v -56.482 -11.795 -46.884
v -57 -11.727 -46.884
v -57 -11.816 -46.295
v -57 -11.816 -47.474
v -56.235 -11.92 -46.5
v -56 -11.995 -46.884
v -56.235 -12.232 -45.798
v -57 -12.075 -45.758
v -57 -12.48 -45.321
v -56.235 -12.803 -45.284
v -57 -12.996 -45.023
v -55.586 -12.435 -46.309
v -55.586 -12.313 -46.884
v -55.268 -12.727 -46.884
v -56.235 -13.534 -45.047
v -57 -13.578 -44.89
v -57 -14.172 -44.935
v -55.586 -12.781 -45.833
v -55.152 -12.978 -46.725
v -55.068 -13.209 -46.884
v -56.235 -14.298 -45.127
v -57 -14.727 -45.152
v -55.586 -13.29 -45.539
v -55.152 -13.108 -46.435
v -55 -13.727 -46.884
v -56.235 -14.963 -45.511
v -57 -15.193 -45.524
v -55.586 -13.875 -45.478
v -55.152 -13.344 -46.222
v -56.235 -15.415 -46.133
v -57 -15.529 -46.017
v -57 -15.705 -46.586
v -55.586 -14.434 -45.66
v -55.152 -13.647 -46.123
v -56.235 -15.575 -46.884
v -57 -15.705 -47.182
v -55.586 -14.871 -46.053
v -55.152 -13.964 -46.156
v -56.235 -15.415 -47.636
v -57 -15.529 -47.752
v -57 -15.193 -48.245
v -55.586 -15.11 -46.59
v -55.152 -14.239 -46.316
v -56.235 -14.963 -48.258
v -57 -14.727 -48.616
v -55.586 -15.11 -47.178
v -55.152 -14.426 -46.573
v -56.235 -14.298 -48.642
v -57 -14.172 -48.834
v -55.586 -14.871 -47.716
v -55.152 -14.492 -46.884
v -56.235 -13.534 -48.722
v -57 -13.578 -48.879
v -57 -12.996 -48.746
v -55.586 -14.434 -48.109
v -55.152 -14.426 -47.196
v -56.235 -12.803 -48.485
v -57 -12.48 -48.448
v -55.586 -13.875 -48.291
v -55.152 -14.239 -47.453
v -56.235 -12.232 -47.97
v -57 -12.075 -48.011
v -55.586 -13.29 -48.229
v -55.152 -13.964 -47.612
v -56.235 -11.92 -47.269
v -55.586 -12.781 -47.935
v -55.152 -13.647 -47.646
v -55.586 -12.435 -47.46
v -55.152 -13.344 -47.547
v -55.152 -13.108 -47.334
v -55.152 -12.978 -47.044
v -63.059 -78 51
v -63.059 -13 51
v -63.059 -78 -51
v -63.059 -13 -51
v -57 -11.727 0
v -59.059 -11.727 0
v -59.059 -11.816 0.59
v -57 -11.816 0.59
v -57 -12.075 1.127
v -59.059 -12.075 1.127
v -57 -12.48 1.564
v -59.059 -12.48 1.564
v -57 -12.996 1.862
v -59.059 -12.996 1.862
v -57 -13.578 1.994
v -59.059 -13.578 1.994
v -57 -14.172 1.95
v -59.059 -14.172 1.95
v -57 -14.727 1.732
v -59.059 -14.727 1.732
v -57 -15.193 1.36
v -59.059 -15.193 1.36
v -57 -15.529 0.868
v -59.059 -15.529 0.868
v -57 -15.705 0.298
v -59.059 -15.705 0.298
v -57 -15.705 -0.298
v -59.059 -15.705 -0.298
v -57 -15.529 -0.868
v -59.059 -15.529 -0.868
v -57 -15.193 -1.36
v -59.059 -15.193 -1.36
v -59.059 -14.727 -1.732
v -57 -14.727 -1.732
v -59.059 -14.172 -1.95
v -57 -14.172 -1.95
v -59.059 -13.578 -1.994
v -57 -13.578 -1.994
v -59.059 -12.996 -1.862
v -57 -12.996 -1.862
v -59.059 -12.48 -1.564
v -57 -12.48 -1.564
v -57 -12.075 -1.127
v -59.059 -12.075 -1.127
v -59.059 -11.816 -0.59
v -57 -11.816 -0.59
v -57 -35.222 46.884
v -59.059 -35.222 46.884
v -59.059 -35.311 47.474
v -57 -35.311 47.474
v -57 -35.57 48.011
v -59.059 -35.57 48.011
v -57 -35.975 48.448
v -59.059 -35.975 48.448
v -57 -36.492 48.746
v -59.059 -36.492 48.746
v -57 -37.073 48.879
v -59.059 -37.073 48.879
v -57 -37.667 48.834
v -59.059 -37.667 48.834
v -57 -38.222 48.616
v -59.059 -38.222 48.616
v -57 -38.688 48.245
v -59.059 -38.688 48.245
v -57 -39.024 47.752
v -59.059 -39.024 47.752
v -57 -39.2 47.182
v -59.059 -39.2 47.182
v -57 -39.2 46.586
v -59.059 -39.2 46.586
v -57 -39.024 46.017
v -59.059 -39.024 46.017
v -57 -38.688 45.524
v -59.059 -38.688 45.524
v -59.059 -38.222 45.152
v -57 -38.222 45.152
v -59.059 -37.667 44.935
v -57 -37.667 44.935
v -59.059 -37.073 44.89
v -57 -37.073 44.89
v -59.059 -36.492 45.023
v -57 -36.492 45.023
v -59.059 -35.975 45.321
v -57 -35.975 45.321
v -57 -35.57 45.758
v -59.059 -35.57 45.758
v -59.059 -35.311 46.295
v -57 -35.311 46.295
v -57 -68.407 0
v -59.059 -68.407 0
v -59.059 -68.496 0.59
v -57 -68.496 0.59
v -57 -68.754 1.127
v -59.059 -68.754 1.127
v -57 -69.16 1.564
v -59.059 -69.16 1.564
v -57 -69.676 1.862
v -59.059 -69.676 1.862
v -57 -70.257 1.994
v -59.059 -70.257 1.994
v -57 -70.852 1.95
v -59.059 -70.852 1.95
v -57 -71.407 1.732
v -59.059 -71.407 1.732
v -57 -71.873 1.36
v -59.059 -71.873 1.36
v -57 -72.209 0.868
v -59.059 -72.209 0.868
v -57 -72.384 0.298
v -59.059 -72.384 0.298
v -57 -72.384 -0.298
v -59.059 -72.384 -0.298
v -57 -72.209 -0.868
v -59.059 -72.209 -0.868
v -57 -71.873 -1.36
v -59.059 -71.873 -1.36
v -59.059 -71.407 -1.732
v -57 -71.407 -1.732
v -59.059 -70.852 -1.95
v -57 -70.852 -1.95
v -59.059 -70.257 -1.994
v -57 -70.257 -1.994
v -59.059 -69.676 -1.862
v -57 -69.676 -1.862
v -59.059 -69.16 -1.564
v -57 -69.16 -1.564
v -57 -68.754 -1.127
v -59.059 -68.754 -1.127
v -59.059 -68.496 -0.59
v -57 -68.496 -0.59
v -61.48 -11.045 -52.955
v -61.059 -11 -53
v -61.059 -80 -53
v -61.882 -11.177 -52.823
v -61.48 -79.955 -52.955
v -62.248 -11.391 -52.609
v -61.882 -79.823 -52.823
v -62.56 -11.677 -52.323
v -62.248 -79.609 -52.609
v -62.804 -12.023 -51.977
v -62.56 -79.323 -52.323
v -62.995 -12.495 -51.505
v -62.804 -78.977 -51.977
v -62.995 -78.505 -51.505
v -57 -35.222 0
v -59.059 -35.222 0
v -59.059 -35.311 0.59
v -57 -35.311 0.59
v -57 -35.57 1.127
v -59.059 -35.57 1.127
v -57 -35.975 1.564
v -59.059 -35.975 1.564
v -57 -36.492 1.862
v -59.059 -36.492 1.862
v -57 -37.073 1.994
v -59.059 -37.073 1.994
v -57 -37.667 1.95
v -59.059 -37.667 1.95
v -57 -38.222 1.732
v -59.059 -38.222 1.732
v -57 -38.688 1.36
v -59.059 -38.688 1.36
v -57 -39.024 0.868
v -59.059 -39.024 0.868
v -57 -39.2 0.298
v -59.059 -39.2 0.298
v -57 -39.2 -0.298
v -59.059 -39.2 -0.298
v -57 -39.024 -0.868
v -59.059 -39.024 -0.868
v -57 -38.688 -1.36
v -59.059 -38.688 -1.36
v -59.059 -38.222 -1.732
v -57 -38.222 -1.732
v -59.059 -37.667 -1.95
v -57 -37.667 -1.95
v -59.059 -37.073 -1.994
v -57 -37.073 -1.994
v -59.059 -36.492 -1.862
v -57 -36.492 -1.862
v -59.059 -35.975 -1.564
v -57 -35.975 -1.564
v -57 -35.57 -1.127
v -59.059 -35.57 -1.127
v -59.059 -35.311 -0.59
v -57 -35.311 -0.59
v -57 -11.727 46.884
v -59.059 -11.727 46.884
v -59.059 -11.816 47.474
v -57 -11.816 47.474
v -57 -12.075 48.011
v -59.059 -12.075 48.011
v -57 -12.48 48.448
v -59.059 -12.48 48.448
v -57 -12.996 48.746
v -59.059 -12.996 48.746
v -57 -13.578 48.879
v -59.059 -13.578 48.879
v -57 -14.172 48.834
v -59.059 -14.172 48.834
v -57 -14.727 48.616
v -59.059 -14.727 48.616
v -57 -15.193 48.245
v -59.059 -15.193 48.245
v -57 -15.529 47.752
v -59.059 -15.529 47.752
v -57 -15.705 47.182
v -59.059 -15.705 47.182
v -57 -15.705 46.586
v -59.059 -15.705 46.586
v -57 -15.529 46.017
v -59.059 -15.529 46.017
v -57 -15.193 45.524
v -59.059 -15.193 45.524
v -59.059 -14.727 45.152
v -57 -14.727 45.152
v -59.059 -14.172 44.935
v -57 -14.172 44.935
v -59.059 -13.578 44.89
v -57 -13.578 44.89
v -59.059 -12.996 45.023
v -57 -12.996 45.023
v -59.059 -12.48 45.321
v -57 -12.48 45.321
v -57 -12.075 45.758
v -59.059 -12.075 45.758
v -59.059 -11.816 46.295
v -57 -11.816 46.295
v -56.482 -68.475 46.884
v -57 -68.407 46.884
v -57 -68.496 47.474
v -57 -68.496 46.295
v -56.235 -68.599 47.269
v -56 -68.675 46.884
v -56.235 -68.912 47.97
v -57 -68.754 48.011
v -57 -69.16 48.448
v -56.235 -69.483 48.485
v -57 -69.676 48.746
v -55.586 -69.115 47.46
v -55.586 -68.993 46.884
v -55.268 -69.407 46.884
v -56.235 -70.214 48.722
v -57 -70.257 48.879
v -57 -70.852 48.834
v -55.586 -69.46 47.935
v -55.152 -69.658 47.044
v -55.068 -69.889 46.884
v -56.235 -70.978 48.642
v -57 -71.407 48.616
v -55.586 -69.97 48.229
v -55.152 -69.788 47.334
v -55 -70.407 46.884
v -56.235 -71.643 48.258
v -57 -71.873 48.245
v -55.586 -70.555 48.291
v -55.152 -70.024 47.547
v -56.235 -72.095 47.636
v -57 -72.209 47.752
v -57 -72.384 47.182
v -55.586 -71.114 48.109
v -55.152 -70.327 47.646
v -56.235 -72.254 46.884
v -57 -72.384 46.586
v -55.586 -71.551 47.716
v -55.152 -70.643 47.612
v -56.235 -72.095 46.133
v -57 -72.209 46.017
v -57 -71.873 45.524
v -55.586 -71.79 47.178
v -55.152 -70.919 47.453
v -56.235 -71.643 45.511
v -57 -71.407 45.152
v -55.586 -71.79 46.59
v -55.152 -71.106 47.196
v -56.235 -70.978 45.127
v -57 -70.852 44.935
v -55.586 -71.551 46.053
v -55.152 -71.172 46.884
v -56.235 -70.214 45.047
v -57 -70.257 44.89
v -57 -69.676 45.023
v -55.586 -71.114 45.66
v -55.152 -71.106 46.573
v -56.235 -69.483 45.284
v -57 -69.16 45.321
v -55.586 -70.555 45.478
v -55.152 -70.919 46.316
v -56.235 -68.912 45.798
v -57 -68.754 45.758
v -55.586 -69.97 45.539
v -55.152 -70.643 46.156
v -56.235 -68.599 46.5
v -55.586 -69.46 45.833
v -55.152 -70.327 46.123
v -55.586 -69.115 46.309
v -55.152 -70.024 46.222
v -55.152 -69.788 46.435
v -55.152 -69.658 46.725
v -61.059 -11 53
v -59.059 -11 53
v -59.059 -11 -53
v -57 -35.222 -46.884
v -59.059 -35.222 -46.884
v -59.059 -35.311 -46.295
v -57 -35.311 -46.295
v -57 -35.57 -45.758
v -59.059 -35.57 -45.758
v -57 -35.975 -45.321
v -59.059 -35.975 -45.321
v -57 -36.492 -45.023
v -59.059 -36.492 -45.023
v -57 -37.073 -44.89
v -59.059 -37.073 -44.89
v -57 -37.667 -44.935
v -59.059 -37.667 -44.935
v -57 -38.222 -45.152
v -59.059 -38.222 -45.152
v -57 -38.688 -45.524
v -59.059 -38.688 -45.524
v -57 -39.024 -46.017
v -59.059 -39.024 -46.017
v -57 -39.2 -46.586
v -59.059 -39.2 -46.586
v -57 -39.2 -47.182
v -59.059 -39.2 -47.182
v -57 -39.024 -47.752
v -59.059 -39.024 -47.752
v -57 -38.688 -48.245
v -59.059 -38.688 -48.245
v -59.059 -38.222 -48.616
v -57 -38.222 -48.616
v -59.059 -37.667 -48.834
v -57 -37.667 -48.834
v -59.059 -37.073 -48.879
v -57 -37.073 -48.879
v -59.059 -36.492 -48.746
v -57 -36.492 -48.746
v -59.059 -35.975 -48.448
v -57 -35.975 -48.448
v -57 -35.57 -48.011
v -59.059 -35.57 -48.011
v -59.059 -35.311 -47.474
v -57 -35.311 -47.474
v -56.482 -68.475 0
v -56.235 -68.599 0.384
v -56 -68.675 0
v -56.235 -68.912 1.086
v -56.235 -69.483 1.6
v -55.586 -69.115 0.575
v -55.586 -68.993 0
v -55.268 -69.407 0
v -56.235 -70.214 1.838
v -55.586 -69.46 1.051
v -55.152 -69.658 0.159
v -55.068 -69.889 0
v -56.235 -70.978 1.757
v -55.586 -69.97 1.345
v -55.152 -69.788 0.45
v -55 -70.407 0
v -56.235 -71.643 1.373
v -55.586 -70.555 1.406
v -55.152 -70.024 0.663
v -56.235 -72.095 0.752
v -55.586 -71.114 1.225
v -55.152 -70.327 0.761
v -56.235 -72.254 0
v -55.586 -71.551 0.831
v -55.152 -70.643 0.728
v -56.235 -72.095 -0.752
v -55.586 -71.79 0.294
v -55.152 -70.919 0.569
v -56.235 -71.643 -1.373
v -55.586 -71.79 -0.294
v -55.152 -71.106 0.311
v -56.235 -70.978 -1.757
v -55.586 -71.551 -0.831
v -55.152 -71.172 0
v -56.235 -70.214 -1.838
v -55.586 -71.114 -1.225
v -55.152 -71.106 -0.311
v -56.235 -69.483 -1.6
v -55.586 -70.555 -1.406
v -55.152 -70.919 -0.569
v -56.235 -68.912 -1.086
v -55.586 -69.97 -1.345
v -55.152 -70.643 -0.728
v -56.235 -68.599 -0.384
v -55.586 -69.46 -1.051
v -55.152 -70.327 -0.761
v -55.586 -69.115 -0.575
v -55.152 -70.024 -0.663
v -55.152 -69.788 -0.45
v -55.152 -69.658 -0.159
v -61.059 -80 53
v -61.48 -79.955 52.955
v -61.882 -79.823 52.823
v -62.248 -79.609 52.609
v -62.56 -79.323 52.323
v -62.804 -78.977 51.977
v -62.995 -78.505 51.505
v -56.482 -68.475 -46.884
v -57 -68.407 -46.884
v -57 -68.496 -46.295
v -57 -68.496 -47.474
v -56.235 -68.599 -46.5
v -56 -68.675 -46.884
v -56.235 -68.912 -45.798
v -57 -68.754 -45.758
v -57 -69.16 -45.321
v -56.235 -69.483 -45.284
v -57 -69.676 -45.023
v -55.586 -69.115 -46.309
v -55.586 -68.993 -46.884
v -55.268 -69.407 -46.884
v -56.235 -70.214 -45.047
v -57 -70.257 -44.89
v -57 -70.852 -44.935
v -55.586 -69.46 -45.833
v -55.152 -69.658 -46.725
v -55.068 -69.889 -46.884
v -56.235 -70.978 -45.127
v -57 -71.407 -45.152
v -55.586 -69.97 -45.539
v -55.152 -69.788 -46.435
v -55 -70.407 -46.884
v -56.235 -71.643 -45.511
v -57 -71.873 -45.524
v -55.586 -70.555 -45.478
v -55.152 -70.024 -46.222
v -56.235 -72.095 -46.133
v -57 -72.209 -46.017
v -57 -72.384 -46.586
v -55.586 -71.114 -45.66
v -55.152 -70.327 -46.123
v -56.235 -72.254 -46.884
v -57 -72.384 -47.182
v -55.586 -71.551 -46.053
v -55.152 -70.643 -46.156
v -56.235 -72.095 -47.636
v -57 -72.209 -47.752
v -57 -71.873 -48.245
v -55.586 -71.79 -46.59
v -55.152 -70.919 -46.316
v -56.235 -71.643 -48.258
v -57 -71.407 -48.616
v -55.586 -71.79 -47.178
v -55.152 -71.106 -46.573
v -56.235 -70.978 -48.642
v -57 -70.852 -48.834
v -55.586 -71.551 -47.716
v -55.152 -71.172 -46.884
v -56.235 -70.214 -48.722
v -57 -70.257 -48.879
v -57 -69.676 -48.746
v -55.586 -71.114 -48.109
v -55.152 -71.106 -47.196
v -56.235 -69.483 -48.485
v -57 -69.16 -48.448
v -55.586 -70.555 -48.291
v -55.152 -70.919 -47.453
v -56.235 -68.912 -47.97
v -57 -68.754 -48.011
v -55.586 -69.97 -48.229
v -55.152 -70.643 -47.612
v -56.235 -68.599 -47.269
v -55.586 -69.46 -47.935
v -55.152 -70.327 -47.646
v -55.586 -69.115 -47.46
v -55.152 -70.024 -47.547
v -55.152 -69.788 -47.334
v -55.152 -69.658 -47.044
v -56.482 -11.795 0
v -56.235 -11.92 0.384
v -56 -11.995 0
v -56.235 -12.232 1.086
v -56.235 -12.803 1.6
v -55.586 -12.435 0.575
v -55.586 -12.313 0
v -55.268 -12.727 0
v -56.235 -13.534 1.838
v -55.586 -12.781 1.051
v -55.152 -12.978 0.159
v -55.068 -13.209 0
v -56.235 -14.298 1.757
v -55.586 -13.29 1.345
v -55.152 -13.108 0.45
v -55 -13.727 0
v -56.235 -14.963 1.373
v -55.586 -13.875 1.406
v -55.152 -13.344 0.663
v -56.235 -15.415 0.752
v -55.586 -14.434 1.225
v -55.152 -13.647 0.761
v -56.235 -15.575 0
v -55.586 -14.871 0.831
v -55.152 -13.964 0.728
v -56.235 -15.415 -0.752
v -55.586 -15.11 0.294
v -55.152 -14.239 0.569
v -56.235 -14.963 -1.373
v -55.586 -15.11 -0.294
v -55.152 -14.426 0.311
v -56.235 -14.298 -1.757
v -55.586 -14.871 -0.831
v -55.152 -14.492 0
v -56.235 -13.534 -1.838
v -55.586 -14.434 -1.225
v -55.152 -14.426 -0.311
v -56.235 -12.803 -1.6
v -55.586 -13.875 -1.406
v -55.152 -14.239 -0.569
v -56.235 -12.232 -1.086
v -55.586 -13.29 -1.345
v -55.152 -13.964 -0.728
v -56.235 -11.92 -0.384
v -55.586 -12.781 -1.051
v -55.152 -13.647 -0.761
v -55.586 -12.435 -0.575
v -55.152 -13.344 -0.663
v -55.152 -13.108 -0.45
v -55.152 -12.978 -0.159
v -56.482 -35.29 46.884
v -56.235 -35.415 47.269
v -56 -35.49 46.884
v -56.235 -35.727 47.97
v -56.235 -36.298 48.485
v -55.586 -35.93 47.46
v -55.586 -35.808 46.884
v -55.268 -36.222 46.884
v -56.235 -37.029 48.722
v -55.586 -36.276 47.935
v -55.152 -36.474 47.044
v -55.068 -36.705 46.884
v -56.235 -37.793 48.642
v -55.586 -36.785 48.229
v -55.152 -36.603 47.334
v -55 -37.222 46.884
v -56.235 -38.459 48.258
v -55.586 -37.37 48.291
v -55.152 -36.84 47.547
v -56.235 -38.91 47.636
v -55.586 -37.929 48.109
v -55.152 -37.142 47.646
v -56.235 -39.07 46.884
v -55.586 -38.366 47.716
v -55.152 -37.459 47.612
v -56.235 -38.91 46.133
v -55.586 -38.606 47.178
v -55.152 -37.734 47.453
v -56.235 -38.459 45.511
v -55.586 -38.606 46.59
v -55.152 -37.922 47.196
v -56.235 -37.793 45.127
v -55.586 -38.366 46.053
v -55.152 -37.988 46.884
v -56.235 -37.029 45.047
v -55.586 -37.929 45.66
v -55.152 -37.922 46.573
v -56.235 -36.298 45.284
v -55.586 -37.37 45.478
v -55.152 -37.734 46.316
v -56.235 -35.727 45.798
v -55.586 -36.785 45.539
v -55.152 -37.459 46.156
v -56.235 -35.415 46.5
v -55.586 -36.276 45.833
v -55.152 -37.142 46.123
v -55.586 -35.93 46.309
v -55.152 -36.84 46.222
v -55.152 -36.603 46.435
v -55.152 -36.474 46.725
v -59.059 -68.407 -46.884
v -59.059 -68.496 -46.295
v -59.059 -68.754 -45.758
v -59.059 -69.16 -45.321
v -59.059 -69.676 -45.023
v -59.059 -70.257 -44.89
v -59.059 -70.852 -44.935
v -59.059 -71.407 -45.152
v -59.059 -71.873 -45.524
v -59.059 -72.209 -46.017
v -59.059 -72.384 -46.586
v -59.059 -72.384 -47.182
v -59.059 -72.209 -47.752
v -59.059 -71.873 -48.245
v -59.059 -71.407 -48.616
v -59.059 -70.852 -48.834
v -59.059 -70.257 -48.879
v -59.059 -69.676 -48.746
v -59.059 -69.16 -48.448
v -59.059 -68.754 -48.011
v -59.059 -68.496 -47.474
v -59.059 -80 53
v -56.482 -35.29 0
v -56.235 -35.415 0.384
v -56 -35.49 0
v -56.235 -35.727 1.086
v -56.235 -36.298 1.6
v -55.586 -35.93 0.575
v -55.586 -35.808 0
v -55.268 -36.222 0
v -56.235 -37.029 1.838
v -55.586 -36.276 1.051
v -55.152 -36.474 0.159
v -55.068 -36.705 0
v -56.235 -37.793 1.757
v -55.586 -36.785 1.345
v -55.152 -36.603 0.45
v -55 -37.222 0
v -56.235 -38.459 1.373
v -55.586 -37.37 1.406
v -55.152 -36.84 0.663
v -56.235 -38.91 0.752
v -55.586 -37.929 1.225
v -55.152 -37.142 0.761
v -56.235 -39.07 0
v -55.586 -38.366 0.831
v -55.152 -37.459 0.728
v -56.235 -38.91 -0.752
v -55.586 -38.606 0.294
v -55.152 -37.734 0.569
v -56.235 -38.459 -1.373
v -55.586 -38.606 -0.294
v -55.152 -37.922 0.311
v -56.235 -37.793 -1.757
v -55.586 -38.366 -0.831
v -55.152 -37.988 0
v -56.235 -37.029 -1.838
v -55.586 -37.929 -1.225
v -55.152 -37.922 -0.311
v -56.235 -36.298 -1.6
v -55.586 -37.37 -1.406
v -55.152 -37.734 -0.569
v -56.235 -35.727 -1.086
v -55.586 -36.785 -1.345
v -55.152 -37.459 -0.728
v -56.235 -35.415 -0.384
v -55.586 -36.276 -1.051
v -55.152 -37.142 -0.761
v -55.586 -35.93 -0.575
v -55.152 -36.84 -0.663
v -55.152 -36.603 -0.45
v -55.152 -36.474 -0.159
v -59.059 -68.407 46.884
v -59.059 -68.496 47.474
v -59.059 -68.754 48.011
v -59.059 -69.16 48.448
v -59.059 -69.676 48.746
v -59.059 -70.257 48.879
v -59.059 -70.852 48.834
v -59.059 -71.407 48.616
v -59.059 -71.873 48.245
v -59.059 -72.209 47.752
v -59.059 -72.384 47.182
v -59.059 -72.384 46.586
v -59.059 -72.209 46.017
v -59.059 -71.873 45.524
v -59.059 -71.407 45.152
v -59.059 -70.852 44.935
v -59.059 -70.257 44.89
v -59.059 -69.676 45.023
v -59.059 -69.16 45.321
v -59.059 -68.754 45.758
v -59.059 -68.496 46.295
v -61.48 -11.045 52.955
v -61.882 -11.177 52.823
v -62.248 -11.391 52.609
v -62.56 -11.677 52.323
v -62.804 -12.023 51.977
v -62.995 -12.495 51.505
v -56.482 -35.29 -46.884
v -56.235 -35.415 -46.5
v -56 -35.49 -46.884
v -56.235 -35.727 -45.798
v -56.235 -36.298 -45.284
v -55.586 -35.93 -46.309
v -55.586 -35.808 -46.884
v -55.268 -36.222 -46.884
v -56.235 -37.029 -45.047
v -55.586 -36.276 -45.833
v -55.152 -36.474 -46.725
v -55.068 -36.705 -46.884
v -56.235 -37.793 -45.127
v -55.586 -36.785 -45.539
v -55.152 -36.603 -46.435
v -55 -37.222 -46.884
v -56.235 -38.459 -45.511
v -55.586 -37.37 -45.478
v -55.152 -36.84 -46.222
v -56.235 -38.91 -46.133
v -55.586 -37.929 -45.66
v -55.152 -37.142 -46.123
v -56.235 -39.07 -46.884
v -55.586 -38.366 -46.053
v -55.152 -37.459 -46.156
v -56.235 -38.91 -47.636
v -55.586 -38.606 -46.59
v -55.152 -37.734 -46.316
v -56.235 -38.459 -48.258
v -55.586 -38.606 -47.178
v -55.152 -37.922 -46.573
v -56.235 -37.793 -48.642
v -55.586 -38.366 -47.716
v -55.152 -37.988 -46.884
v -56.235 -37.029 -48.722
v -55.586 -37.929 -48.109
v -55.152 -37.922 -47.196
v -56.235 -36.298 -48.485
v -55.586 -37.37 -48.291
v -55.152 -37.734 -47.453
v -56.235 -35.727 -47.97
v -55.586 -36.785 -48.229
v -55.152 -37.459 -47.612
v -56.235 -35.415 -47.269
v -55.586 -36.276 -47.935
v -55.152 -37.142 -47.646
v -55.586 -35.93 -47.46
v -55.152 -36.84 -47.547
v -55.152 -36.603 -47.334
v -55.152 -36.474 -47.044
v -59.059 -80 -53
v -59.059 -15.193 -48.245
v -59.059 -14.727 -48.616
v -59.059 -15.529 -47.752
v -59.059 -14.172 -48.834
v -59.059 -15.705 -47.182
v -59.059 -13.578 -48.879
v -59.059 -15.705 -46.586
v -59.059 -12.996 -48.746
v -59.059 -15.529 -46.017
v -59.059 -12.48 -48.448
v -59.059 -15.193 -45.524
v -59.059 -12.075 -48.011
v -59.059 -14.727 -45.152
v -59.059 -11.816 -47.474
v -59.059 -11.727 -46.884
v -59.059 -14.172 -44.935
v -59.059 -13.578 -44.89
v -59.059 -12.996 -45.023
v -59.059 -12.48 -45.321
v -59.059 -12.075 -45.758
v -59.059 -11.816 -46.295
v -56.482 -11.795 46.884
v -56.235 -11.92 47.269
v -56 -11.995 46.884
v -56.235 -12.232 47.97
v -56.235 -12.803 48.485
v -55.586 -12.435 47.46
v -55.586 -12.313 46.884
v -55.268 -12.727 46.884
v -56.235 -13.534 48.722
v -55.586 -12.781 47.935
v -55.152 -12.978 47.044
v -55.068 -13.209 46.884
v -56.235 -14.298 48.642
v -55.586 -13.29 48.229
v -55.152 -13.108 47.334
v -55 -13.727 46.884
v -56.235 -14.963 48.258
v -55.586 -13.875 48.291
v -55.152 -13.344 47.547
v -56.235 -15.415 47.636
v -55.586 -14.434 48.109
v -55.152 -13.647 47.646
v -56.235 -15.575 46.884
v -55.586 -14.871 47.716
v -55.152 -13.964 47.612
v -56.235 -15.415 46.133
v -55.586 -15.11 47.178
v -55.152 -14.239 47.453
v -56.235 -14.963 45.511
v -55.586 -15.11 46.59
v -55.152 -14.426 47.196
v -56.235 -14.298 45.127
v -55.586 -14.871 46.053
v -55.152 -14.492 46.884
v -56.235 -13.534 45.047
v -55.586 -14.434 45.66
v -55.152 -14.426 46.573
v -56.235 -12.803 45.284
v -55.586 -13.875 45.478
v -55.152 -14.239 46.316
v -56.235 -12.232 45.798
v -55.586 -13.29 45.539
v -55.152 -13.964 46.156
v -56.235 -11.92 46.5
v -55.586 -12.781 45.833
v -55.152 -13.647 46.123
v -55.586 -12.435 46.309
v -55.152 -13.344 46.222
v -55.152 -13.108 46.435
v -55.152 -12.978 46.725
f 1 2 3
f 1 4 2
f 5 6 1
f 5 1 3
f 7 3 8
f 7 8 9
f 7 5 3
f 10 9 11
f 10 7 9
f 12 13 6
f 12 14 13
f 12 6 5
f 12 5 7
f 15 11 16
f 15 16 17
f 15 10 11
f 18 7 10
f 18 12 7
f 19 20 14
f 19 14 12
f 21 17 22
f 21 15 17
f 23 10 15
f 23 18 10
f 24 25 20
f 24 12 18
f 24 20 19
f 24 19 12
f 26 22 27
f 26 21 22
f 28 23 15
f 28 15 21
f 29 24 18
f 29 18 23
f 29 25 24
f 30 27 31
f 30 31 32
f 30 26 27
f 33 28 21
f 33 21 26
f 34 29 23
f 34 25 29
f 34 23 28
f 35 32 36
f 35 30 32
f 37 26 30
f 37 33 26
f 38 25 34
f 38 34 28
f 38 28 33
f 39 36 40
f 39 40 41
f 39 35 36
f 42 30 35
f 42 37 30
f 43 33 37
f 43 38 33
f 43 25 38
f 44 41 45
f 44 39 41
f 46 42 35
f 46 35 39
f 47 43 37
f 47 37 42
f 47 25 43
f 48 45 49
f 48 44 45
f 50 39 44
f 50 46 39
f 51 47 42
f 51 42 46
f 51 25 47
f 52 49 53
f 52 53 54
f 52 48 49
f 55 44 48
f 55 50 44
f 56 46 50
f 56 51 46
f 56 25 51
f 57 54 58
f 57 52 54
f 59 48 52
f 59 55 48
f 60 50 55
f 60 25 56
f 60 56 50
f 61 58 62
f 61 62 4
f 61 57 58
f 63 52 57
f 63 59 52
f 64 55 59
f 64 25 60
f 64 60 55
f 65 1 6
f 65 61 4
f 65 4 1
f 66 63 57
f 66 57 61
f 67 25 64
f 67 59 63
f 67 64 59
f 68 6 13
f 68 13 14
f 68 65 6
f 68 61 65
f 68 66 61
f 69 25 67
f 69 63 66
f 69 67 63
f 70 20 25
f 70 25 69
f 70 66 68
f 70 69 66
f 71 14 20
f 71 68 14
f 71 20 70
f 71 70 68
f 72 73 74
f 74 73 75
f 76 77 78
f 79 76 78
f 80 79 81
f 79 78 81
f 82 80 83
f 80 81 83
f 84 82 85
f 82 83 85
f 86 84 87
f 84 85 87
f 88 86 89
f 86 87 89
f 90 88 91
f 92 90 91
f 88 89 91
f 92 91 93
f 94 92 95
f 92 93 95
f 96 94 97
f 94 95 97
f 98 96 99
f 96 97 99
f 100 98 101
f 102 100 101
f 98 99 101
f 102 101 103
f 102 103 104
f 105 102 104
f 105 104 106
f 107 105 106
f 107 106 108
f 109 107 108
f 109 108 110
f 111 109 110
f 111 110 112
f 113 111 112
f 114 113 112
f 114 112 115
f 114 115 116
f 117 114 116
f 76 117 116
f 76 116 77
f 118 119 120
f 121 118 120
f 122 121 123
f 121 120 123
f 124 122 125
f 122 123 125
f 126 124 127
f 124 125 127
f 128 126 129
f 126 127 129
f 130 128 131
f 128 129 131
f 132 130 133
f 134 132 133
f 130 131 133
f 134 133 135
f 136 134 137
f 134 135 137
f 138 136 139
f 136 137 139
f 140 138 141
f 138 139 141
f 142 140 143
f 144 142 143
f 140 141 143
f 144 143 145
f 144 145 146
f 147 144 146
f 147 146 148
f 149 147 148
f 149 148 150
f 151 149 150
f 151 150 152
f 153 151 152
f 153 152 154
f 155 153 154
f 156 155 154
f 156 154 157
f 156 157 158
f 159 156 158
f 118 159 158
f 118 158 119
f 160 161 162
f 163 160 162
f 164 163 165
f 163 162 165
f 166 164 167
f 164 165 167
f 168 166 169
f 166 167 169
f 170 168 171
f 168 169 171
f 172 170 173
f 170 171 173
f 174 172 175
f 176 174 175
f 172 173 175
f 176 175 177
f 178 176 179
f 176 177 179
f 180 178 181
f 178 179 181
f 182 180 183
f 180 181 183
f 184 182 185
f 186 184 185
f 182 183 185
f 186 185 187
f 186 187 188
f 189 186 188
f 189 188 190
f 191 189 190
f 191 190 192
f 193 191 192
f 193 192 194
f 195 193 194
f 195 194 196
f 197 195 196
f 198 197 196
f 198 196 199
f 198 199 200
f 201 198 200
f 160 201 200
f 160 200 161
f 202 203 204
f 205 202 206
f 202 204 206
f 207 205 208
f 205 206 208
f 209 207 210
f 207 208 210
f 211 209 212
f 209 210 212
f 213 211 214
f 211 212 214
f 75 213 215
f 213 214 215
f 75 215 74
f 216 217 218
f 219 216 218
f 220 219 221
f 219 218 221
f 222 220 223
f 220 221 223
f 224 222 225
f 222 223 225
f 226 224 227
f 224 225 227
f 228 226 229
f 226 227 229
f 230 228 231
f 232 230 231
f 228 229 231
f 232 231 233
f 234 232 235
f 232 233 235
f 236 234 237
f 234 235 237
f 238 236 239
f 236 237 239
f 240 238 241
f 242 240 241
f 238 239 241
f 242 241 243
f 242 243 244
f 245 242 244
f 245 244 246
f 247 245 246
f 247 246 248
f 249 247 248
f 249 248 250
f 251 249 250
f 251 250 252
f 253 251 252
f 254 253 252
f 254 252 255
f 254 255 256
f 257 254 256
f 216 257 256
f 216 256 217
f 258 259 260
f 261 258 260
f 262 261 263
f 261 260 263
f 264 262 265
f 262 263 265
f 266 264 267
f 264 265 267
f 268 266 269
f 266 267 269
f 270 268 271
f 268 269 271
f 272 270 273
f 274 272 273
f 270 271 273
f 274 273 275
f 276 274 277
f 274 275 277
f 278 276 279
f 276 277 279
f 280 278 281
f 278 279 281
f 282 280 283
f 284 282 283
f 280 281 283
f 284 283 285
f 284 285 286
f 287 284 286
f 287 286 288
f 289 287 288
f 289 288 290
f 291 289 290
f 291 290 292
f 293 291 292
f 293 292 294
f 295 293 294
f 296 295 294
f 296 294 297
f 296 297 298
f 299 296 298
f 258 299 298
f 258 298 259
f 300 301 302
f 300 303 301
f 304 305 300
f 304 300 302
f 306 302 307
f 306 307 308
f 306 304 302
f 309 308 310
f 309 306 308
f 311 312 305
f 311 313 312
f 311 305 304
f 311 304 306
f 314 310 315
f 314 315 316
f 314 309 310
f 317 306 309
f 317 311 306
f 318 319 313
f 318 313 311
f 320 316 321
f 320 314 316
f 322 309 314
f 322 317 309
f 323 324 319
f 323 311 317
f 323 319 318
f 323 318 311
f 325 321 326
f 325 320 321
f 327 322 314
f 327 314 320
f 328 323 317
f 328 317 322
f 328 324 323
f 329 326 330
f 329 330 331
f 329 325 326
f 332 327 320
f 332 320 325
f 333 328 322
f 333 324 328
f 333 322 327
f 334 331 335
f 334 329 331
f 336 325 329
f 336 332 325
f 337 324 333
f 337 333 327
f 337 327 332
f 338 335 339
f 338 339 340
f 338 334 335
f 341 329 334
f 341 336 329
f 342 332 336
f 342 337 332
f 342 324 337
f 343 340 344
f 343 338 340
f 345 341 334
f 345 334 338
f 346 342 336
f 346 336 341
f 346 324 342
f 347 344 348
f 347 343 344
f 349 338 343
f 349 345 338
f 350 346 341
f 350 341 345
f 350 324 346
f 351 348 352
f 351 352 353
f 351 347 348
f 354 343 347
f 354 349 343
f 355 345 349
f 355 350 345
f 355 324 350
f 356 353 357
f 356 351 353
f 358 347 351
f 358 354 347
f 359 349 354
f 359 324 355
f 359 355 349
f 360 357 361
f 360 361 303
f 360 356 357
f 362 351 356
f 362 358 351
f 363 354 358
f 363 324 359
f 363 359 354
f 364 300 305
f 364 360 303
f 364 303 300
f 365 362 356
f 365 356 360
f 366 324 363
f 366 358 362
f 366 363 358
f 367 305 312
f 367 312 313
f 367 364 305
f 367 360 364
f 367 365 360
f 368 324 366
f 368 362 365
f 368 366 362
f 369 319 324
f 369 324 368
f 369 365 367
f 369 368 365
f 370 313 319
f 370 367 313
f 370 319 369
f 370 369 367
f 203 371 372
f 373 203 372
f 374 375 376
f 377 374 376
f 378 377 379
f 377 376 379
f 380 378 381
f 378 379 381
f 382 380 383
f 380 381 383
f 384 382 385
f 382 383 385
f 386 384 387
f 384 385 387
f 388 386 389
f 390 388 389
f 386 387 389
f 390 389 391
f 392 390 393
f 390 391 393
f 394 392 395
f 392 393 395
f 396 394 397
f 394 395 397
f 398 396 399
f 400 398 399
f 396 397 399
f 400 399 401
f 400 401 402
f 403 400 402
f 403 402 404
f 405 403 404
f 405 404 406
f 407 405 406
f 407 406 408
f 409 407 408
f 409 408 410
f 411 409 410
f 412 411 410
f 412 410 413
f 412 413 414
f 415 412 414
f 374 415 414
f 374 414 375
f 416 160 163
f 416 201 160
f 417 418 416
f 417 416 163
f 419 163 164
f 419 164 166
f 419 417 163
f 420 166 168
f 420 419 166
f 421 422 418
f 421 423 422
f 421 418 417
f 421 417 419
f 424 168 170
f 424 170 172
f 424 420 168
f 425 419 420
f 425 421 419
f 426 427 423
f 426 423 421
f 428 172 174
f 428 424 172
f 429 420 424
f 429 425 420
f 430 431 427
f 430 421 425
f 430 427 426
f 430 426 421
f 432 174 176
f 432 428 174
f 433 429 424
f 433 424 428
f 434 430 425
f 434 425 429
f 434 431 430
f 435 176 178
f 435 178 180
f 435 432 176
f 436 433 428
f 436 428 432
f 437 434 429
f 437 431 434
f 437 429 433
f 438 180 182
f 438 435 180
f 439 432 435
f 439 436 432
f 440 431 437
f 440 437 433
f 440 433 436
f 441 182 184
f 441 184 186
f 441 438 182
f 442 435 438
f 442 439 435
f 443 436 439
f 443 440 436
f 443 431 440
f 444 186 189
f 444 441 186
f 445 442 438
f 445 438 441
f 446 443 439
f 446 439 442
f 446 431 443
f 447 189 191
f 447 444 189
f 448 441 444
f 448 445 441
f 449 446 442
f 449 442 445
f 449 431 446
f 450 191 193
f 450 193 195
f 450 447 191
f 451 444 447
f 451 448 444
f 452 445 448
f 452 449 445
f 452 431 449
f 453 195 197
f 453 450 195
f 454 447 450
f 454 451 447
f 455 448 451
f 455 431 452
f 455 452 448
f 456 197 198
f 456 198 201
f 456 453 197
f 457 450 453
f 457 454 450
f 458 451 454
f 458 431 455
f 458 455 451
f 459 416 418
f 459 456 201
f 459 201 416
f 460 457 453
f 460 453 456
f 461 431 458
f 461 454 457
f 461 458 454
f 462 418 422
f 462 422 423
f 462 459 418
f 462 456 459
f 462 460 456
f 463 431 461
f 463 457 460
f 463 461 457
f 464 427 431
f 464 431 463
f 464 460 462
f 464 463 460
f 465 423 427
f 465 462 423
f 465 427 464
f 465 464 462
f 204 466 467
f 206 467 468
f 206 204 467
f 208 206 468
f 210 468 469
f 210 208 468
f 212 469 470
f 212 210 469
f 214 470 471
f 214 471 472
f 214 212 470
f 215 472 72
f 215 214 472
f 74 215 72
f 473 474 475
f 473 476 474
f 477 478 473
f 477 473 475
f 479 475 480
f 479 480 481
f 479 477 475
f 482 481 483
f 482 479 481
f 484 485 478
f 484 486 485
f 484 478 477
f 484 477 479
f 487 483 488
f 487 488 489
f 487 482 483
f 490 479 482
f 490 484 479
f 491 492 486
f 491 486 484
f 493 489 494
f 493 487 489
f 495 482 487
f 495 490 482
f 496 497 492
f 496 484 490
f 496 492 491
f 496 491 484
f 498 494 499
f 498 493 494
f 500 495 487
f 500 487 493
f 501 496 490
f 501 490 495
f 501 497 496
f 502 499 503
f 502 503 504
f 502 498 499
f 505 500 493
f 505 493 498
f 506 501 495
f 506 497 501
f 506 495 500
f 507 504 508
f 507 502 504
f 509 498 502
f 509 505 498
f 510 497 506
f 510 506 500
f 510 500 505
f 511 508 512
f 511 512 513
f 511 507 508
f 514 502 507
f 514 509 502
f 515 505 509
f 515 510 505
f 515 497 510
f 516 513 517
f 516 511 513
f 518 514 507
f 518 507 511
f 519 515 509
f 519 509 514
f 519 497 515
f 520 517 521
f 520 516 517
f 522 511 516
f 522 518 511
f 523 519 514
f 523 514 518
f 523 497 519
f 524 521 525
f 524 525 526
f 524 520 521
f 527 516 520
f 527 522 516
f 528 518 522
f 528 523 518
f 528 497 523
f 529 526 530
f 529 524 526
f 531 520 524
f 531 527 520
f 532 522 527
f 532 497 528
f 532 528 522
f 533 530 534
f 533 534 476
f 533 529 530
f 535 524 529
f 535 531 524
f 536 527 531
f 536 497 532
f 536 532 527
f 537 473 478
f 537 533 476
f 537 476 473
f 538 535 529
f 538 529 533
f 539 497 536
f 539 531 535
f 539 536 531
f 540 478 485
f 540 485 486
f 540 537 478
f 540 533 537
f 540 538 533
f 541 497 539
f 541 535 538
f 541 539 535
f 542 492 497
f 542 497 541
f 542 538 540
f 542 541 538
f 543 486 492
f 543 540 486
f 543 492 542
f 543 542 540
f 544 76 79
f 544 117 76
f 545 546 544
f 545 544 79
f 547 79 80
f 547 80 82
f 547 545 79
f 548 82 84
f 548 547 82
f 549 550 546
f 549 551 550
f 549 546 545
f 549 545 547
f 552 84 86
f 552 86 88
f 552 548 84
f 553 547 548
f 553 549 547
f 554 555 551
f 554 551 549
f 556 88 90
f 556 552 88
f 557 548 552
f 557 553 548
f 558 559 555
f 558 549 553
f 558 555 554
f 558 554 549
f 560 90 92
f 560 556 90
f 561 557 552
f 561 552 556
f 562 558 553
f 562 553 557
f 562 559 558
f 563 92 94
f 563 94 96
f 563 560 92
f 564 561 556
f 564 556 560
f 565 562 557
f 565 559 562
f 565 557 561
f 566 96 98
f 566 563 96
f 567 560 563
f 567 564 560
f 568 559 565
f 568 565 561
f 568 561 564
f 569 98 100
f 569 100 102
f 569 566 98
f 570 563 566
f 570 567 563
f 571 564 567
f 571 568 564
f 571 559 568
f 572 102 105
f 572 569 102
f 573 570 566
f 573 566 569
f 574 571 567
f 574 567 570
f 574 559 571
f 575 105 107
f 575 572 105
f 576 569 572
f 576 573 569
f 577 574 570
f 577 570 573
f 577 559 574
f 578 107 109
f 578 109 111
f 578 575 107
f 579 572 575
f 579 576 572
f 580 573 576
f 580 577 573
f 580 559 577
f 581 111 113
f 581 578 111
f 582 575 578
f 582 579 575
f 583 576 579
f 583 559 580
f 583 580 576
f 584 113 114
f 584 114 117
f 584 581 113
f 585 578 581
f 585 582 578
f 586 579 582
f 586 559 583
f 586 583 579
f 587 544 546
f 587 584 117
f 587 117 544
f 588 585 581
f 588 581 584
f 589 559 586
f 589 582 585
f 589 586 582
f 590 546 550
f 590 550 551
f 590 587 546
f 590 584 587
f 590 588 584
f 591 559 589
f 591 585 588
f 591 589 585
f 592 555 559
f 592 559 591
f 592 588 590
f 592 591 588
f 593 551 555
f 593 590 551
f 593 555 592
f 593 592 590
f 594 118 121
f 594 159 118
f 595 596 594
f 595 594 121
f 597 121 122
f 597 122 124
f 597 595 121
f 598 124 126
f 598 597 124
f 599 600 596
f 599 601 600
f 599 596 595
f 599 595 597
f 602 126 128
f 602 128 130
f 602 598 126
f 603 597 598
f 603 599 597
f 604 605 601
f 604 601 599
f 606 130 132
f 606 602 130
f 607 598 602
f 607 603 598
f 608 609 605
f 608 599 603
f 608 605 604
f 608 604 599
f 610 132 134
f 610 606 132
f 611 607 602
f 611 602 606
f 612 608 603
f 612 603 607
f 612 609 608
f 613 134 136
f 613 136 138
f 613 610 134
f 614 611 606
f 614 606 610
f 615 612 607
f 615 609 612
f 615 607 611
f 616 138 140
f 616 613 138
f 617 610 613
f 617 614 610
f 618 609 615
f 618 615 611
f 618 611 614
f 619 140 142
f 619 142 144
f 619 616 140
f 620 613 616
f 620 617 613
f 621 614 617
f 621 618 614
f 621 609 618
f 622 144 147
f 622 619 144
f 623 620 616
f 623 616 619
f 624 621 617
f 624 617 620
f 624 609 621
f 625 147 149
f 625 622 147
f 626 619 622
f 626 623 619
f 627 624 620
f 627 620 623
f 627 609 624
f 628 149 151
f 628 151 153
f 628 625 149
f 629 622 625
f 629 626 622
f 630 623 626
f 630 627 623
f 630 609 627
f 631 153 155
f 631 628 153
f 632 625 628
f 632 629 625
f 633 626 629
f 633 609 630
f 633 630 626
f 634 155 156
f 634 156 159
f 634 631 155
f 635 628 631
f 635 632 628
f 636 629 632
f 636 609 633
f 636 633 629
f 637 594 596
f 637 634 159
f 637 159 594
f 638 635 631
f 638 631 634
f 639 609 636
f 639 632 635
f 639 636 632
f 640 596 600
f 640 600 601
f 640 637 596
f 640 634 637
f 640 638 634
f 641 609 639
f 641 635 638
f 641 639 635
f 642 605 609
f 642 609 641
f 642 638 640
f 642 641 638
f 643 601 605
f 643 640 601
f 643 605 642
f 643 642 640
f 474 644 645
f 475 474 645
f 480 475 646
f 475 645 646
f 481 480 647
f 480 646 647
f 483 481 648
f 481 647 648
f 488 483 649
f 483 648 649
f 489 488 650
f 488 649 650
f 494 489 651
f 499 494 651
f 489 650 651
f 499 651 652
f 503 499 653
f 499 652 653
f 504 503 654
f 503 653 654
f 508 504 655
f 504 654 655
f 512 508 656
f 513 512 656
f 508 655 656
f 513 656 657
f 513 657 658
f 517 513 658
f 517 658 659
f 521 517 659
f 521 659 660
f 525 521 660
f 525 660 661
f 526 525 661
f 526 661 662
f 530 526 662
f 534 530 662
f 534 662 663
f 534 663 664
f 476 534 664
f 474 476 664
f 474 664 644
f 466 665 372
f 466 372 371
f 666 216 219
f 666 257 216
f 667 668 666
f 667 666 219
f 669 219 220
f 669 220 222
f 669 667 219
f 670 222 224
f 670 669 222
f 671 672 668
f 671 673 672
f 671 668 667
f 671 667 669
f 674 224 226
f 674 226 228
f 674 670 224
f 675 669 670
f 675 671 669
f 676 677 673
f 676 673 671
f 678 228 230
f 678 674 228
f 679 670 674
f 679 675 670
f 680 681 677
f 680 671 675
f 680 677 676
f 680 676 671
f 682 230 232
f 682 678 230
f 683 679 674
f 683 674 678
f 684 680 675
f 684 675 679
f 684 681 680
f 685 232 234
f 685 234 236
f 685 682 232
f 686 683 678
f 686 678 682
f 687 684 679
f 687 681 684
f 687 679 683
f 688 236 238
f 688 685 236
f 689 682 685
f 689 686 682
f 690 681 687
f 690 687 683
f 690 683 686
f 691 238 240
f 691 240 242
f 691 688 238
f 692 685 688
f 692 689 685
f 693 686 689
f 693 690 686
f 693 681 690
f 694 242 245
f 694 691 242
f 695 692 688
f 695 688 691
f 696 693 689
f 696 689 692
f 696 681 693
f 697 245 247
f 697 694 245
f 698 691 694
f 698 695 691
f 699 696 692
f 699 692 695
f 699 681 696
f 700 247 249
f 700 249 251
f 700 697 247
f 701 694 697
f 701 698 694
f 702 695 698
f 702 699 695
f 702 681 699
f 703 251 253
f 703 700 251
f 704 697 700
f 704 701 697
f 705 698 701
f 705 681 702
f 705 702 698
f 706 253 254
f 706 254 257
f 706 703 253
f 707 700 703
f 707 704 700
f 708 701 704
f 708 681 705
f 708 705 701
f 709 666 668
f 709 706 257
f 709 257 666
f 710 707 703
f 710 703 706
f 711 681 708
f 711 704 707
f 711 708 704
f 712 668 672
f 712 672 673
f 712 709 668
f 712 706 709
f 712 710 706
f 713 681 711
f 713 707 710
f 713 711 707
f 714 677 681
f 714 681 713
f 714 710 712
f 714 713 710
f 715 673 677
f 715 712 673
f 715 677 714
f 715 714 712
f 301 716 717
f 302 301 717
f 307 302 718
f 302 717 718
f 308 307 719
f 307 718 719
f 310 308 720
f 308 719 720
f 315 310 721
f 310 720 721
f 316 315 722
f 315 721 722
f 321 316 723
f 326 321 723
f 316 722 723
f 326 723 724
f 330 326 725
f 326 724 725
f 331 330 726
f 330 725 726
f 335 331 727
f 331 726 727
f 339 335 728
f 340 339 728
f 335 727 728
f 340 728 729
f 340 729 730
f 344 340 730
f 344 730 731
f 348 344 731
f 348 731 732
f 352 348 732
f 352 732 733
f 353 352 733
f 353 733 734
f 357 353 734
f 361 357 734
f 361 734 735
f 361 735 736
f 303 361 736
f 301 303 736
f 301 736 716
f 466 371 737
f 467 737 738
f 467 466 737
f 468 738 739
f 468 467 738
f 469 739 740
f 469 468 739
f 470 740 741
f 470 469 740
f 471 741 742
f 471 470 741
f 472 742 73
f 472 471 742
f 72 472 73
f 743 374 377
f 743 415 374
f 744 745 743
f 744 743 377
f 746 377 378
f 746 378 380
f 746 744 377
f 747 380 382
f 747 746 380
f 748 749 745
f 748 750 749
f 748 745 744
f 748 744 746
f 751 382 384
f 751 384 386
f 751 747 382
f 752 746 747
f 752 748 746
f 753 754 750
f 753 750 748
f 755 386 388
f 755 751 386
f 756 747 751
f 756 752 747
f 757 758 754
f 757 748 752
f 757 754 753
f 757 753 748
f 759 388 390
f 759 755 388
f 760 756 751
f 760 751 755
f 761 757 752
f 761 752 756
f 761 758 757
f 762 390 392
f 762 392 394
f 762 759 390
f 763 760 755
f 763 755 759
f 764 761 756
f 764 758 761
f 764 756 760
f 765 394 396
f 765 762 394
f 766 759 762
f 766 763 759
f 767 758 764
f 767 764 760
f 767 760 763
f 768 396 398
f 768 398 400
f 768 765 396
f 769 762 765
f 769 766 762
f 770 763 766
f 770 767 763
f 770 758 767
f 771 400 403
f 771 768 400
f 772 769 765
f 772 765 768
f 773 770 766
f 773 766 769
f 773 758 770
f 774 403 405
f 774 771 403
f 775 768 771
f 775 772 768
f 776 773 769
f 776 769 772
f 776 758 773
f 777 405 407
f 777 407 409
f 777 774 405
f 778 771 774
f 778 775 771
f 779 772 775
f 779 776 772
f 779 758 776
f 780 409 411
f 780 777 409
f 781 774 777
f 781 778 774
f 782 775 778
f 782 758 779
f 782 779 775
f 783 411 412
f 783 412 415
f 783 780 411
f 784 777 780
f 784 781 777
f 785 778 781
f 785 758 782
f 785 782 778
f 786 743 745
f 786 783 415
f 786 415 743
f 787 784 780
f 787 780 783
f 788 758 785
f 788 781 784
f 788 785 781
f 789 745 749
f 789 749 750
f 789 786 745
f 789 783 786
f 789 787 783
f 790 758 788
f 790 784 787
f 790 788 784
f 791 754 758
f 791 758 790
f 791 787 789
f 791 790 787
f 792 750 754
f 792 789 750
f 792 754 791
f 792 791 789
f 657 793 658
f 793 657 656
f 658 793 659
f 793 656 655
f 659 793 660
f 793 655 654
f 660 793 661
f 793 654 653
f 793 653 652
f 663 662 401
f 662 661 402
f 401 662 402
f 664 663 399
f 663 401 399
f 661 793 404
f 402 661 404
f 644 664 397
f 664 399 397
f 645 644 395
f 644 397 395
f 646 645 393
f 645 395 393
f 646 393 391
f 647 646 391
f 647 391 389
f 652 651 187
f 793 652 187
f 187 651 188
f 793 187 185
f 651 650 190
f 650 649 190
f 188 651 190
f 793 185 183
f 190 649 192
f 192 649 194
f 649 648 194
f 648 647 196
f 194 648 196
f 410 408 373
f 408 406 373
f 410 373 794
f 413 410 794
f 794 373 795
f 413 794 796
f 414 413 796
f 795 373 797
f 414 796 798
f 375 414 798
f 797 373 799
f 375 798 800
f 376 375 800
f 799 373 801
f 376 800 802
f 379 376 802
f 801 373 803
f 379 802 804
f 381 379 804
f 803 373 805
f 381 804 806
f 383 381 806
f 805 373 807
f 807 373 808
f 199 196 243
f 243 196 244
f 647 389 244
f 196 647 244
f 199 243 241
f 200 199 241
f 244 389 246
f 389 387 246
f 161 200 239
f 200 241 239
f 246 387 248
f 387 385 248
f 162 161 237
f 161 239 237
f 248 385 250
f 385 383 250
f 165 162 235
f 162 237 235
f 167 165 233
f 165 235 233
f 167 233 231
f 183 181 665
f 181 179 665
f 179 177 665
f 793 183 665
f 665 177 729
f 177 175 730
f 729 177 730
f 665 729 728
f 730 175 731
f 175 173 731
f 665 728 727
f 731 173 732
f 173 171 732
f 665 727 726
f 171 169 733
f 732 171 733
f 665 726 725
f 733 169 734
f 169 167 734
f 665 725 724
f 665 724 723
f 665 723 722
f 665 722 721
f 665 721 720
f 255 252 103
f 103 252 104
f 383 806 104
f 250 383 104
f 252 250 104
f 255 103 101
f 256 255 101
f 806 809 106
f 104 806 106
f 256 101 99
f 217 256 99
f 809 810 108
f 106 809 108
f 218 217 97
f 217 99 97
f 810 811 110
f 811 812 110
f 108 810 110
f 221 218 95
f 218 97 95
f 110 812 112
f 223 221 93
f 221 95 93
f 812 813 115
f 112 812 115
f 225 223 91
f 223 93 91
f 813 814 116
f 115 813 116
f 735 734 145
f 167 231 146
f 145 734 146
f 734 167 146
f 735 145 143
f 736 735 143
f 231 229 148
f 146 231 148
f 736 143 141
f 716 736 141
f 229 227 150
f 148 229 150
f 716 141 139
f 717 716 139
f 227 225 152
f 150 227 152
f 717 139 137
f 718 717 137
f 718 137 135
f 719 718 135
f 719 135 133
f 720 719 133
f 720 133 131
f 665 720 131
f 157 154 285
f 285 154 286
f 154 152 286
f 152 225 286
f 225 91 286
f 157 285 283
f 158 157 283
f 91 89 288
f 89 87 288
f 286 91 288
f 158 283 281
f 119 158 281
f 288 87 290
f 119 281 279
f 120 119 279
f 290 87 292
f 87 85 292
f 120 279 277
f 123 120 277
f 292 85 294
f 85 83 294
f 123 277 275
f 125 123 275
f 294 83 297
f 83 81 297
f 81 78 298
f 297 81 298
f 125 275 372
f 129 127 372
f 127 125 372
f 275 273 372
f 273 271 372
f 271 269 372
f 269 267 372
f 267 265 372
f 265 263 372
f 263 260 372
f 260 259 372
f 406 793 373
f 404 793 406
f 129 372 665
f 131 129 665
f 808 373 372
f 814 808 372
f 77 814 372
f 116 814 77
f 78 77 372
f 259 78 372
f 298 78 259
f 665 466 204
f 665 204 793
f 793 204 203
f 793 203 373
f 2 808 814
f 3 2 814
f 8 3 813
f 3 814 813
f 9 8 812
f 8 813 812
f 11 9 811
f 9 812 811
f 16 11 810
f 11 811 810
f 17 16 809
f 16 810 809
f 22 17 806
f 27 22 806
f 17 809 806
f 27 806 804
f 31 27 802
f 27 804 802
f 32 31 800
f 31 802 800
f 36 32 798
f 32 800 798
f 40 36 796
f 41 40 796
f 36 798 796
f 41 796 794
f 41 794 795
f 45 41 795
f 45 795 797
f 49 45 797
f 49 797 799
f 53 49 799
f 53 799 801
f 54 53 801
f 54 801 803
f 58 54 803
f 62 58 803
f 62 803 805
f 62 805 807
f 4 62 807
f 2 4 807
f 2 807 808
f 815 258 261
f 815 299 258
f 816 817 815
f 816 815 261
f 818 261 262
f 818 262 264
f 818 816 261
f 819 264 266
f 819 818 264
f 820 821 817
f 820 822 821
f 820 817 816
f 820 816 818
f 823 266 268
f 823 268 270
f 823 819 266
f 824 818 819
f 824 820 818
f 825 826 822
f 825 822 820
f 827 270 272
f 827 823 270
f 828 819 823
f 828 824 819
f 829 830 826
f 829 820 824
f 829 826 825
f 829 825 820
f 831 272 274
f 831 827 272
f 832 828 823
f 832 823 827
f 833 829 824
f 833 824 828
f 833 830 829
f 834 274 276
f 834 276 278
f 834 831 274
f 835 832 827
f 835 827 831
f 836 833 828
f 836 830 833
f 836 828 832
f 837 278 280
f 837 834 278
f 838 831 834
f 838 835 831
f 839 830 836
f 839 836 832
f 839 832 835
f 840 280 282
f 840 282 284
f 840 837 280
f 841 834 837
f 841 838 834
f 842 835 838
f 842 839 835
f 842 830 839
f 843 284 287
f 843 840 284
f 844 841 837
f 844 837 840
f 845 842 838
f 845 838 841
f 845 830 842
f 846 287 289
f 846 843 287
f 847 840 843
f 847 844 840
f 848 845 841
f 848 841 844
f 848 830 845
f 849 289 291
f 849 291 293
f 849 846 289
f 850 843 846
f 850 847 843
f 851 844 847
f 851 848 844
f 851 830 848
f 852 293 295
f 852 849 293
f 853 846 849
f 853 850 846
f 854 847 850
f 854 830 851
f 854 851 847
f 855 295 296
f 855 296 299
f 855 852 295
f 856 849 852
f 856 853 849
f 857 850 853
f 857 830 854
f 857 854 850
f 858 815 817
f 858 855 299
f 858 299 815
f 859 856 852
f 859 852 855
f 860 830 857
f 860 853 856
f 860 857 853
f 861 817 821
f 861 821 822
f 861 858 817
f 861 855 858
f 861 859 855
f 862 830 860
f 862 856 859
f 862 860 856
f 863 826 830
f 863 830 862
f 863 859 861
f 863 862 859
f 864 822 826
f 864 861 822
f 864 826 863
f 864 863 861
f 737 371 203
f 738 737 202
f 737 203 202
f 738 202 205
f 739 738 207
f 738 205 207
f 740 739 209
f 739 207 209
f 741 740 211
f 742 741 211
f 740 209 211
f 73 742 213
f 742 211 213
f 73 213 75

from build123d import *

# Parameters (mm, degrees)
F1_START = 11
F1_DEPTH = 69
F4_START = 21.75
F3_R     = 2
F4_DEPTH = 4.25
F5_R     = 2
F6_R     = 2


with BuildPart() as f1:
    # F0 (on Front) → F1 (new body)
    with BuildSketch(Plane.XZ.offset(F1_START)):
        Polygon((-59.0593354404, 0), (-59.0593354404, 53), (-63.0593354404, 53), (-63.0593354404, -53), (-59.0593354404, -53), align=None)
    extrude(amount=F1_DEPTH)

    # F3 (on offset) → F4 (join)
    with BuildSketch(Plane.YZ.offset(-81).offset(F4_START)):
        with Locations((-70.4067274928, -46.8843728304)):
            Circle(F3_R)
        with Locations((-70.4067274928, 0)):
            Circle(F3_R)
        with Locations((-70.4067274928, 46.8843728304)):
            Circle(F3_R)
        with Locations((-37.2223369777, 46.8843728304)):
            Circle(F3_R)
        with Locations((-37.2223369777, 0)):
            Circle(F3_R)
        with Locations((-37.2223369777, -46.8843728304)):
            Circle(F3_R)
        with Locations((-13.7270642444, 46.8843728304)):
            Circle(F3_R)
        with Locations((-13.7270642444, 0)):
            Circle(F3_R)
        with Locations((-13.7270642444, -46.8843728304)):
            Circle(F3_R)
    extrude(amount=F4_DEPTH)

    # F5
    f5_edges = [f1.edges().sort_by_distance(p)[0] for p in [
        (-55, -72.406727, 0),
        (-55, -72.406727, 46.884373),
        (-55, -72.406727, -46.884373),
        (-55, -39.222337, -46.884373),
        (-55, -39.222337, 0),
        (-55, -39.222337, 46.884373),
        (-55, -15.727064, 46.884373),
        (-55, -15.727064, 0),
        (-55, -15.727064, -46.884373),
    ]]
    fillet(f5_edges, radius=F5_R)

    # F6
    f6_edges = [f1.edges().sort_by_distance(p)[0] for p in [
        (-63.059335, -45.5, 53),
        (-63.059335, -45.5, -53),
        (-63.059335, -11, 0),
        (-63.059335, -80, 0),
    ]]
    fillet(f6_edges, radius=F6_R)


solid = f1.part
